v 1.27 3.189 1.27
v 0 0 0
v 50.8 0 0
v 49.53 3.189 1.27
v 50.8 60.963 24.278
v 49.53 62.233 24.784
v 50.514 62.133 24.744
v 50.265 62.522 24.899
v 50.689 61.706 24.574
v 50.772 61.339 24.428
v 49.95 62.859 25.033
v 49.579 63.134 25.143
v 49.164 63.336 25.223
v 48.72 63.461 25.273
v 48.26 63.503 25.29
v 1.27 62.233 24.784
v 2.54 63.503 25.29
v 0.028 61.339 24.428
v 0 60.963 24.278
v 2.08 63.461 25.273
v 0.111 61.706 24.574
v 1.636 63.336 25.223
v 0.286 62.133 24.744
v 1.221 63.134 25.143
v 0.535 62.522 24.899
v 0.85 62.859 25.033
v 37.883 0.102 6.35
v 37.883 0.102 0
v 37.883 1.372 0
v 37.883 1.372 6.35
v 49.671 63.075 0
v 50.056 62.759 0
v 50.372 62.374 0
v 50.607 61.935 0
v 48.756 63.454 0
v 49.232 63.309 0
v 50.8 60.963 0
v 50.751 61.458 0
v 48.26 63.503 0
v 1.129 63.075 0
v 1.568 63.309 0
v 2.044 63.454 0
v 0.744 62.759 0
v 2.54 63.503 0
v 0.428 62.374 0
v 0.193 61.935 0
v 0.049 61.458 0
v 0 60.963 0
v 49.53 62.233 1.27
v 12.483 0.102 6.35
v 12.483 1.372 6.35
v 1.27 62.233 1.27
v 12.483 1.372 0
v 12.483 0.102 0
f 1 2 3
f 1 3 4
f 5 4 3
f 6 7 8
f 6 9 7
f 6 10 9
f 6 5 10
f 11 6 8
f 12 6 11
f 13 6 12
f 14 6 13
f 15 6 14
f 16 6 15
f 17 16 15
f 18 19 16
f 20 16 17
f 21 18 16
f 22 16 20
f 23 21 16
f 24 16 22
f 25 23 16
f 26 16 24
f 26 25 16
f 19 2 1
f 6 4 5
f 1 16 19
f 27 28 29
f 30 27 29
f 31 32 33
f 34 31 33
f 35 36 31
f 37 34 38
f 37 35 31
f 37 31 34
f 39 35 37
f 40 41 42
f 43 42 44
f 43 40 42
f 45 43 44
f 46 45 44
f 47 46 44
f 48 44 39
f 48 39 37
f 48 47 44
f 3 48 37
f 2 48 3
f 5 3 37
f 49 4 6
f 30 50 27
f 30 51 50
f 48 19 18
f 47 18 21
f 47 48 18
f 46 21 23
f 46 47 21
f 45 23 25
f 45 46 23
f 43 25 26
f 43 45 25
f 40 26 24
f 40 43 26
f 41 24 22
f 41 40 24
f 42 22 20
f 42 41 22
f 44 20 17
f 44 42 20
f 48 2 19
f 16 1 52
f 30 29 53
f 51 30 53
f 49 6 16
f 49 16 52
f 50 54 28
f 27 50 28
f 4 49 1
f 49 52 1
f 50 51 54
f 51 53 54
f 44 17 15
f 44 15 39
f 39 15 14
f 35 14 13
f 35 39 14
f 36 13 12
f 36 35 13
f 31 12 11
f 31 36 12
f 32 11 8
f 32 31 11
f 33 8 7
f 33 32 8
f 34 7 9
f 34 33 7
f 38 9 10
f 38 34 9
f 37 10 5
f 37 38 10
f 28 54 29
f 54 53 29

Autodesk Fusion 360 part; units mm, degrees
sketch "Sketch1" plane through (0, 0, 0) normal (0, 0, 1) x (1, 0, 0)
  line L0 (0, 0) -> (52.7547, 0)
  line L1 (52.7547, 0) -> (52.7547, 76.2575)
  line L2 (52.7547, 76.2575) -> (0, 76.2575)
  line L3 (0, 76.2575) -> (0, 0)
sketch "Sketch2" plane through (0, 0, 0) normal (0, 0, 1) x (1, 0, 0)
  line L0 (0, 0) -> (38.1, 0)
  line L1 (38.1, 0) -> (38.1, 63.5)
  line L2 (38.1, 63.5) -> (0, 63.5)
  line L3 (0, 63.5) -> (0, 0)
  dimension "d6" = 38.1
  dimension "d7" = 63.5
sketch "Sketch3" plane through (0, 0, 0) normal (1, 0, 0) x (0, 1, 0)
  line L0 (0, 0) -> (63.5027, 25.2897)
  line L1 (63.5027, 25.2897) -> (63.5027, 0)
  line L2 (63.5027, 0) -> (0, 0)
extrude "Extrude3" add sketch "Sketch3" along normal blind 50.8 makes body 1
shell "Shell3" thickness 1.27 removed faces 1 at (16.9333, 21.1676, 8.4299) on bodies 1
fillet "Fillet2" radius 2.54 2 edges at (50.8, 63.5027, 12.6449) (0, 63.5027, 12.6449) on bodies 1
sketch "Sketch4" plane through (0, 0, 0) normal (0, 0, 1) x (1, 0, 0)
  line L0 (12.483, 0.1021) -> (37.883, 0.1021)
  line L1 (37.883, 0.1021) -> (37.883, 1.3721)
  line L2 (37.883, 1.3721) -> (12.483, 1.3721)
  line L3 (12.483, 1.3721) -> (12.483, 0.1021)
  dimension "d16" = 25.4
  dimension "d17" = 1.27
extrude "Extrude4" add sketch "Sketch4" along normal blind 6.35 separate body makes body 2
